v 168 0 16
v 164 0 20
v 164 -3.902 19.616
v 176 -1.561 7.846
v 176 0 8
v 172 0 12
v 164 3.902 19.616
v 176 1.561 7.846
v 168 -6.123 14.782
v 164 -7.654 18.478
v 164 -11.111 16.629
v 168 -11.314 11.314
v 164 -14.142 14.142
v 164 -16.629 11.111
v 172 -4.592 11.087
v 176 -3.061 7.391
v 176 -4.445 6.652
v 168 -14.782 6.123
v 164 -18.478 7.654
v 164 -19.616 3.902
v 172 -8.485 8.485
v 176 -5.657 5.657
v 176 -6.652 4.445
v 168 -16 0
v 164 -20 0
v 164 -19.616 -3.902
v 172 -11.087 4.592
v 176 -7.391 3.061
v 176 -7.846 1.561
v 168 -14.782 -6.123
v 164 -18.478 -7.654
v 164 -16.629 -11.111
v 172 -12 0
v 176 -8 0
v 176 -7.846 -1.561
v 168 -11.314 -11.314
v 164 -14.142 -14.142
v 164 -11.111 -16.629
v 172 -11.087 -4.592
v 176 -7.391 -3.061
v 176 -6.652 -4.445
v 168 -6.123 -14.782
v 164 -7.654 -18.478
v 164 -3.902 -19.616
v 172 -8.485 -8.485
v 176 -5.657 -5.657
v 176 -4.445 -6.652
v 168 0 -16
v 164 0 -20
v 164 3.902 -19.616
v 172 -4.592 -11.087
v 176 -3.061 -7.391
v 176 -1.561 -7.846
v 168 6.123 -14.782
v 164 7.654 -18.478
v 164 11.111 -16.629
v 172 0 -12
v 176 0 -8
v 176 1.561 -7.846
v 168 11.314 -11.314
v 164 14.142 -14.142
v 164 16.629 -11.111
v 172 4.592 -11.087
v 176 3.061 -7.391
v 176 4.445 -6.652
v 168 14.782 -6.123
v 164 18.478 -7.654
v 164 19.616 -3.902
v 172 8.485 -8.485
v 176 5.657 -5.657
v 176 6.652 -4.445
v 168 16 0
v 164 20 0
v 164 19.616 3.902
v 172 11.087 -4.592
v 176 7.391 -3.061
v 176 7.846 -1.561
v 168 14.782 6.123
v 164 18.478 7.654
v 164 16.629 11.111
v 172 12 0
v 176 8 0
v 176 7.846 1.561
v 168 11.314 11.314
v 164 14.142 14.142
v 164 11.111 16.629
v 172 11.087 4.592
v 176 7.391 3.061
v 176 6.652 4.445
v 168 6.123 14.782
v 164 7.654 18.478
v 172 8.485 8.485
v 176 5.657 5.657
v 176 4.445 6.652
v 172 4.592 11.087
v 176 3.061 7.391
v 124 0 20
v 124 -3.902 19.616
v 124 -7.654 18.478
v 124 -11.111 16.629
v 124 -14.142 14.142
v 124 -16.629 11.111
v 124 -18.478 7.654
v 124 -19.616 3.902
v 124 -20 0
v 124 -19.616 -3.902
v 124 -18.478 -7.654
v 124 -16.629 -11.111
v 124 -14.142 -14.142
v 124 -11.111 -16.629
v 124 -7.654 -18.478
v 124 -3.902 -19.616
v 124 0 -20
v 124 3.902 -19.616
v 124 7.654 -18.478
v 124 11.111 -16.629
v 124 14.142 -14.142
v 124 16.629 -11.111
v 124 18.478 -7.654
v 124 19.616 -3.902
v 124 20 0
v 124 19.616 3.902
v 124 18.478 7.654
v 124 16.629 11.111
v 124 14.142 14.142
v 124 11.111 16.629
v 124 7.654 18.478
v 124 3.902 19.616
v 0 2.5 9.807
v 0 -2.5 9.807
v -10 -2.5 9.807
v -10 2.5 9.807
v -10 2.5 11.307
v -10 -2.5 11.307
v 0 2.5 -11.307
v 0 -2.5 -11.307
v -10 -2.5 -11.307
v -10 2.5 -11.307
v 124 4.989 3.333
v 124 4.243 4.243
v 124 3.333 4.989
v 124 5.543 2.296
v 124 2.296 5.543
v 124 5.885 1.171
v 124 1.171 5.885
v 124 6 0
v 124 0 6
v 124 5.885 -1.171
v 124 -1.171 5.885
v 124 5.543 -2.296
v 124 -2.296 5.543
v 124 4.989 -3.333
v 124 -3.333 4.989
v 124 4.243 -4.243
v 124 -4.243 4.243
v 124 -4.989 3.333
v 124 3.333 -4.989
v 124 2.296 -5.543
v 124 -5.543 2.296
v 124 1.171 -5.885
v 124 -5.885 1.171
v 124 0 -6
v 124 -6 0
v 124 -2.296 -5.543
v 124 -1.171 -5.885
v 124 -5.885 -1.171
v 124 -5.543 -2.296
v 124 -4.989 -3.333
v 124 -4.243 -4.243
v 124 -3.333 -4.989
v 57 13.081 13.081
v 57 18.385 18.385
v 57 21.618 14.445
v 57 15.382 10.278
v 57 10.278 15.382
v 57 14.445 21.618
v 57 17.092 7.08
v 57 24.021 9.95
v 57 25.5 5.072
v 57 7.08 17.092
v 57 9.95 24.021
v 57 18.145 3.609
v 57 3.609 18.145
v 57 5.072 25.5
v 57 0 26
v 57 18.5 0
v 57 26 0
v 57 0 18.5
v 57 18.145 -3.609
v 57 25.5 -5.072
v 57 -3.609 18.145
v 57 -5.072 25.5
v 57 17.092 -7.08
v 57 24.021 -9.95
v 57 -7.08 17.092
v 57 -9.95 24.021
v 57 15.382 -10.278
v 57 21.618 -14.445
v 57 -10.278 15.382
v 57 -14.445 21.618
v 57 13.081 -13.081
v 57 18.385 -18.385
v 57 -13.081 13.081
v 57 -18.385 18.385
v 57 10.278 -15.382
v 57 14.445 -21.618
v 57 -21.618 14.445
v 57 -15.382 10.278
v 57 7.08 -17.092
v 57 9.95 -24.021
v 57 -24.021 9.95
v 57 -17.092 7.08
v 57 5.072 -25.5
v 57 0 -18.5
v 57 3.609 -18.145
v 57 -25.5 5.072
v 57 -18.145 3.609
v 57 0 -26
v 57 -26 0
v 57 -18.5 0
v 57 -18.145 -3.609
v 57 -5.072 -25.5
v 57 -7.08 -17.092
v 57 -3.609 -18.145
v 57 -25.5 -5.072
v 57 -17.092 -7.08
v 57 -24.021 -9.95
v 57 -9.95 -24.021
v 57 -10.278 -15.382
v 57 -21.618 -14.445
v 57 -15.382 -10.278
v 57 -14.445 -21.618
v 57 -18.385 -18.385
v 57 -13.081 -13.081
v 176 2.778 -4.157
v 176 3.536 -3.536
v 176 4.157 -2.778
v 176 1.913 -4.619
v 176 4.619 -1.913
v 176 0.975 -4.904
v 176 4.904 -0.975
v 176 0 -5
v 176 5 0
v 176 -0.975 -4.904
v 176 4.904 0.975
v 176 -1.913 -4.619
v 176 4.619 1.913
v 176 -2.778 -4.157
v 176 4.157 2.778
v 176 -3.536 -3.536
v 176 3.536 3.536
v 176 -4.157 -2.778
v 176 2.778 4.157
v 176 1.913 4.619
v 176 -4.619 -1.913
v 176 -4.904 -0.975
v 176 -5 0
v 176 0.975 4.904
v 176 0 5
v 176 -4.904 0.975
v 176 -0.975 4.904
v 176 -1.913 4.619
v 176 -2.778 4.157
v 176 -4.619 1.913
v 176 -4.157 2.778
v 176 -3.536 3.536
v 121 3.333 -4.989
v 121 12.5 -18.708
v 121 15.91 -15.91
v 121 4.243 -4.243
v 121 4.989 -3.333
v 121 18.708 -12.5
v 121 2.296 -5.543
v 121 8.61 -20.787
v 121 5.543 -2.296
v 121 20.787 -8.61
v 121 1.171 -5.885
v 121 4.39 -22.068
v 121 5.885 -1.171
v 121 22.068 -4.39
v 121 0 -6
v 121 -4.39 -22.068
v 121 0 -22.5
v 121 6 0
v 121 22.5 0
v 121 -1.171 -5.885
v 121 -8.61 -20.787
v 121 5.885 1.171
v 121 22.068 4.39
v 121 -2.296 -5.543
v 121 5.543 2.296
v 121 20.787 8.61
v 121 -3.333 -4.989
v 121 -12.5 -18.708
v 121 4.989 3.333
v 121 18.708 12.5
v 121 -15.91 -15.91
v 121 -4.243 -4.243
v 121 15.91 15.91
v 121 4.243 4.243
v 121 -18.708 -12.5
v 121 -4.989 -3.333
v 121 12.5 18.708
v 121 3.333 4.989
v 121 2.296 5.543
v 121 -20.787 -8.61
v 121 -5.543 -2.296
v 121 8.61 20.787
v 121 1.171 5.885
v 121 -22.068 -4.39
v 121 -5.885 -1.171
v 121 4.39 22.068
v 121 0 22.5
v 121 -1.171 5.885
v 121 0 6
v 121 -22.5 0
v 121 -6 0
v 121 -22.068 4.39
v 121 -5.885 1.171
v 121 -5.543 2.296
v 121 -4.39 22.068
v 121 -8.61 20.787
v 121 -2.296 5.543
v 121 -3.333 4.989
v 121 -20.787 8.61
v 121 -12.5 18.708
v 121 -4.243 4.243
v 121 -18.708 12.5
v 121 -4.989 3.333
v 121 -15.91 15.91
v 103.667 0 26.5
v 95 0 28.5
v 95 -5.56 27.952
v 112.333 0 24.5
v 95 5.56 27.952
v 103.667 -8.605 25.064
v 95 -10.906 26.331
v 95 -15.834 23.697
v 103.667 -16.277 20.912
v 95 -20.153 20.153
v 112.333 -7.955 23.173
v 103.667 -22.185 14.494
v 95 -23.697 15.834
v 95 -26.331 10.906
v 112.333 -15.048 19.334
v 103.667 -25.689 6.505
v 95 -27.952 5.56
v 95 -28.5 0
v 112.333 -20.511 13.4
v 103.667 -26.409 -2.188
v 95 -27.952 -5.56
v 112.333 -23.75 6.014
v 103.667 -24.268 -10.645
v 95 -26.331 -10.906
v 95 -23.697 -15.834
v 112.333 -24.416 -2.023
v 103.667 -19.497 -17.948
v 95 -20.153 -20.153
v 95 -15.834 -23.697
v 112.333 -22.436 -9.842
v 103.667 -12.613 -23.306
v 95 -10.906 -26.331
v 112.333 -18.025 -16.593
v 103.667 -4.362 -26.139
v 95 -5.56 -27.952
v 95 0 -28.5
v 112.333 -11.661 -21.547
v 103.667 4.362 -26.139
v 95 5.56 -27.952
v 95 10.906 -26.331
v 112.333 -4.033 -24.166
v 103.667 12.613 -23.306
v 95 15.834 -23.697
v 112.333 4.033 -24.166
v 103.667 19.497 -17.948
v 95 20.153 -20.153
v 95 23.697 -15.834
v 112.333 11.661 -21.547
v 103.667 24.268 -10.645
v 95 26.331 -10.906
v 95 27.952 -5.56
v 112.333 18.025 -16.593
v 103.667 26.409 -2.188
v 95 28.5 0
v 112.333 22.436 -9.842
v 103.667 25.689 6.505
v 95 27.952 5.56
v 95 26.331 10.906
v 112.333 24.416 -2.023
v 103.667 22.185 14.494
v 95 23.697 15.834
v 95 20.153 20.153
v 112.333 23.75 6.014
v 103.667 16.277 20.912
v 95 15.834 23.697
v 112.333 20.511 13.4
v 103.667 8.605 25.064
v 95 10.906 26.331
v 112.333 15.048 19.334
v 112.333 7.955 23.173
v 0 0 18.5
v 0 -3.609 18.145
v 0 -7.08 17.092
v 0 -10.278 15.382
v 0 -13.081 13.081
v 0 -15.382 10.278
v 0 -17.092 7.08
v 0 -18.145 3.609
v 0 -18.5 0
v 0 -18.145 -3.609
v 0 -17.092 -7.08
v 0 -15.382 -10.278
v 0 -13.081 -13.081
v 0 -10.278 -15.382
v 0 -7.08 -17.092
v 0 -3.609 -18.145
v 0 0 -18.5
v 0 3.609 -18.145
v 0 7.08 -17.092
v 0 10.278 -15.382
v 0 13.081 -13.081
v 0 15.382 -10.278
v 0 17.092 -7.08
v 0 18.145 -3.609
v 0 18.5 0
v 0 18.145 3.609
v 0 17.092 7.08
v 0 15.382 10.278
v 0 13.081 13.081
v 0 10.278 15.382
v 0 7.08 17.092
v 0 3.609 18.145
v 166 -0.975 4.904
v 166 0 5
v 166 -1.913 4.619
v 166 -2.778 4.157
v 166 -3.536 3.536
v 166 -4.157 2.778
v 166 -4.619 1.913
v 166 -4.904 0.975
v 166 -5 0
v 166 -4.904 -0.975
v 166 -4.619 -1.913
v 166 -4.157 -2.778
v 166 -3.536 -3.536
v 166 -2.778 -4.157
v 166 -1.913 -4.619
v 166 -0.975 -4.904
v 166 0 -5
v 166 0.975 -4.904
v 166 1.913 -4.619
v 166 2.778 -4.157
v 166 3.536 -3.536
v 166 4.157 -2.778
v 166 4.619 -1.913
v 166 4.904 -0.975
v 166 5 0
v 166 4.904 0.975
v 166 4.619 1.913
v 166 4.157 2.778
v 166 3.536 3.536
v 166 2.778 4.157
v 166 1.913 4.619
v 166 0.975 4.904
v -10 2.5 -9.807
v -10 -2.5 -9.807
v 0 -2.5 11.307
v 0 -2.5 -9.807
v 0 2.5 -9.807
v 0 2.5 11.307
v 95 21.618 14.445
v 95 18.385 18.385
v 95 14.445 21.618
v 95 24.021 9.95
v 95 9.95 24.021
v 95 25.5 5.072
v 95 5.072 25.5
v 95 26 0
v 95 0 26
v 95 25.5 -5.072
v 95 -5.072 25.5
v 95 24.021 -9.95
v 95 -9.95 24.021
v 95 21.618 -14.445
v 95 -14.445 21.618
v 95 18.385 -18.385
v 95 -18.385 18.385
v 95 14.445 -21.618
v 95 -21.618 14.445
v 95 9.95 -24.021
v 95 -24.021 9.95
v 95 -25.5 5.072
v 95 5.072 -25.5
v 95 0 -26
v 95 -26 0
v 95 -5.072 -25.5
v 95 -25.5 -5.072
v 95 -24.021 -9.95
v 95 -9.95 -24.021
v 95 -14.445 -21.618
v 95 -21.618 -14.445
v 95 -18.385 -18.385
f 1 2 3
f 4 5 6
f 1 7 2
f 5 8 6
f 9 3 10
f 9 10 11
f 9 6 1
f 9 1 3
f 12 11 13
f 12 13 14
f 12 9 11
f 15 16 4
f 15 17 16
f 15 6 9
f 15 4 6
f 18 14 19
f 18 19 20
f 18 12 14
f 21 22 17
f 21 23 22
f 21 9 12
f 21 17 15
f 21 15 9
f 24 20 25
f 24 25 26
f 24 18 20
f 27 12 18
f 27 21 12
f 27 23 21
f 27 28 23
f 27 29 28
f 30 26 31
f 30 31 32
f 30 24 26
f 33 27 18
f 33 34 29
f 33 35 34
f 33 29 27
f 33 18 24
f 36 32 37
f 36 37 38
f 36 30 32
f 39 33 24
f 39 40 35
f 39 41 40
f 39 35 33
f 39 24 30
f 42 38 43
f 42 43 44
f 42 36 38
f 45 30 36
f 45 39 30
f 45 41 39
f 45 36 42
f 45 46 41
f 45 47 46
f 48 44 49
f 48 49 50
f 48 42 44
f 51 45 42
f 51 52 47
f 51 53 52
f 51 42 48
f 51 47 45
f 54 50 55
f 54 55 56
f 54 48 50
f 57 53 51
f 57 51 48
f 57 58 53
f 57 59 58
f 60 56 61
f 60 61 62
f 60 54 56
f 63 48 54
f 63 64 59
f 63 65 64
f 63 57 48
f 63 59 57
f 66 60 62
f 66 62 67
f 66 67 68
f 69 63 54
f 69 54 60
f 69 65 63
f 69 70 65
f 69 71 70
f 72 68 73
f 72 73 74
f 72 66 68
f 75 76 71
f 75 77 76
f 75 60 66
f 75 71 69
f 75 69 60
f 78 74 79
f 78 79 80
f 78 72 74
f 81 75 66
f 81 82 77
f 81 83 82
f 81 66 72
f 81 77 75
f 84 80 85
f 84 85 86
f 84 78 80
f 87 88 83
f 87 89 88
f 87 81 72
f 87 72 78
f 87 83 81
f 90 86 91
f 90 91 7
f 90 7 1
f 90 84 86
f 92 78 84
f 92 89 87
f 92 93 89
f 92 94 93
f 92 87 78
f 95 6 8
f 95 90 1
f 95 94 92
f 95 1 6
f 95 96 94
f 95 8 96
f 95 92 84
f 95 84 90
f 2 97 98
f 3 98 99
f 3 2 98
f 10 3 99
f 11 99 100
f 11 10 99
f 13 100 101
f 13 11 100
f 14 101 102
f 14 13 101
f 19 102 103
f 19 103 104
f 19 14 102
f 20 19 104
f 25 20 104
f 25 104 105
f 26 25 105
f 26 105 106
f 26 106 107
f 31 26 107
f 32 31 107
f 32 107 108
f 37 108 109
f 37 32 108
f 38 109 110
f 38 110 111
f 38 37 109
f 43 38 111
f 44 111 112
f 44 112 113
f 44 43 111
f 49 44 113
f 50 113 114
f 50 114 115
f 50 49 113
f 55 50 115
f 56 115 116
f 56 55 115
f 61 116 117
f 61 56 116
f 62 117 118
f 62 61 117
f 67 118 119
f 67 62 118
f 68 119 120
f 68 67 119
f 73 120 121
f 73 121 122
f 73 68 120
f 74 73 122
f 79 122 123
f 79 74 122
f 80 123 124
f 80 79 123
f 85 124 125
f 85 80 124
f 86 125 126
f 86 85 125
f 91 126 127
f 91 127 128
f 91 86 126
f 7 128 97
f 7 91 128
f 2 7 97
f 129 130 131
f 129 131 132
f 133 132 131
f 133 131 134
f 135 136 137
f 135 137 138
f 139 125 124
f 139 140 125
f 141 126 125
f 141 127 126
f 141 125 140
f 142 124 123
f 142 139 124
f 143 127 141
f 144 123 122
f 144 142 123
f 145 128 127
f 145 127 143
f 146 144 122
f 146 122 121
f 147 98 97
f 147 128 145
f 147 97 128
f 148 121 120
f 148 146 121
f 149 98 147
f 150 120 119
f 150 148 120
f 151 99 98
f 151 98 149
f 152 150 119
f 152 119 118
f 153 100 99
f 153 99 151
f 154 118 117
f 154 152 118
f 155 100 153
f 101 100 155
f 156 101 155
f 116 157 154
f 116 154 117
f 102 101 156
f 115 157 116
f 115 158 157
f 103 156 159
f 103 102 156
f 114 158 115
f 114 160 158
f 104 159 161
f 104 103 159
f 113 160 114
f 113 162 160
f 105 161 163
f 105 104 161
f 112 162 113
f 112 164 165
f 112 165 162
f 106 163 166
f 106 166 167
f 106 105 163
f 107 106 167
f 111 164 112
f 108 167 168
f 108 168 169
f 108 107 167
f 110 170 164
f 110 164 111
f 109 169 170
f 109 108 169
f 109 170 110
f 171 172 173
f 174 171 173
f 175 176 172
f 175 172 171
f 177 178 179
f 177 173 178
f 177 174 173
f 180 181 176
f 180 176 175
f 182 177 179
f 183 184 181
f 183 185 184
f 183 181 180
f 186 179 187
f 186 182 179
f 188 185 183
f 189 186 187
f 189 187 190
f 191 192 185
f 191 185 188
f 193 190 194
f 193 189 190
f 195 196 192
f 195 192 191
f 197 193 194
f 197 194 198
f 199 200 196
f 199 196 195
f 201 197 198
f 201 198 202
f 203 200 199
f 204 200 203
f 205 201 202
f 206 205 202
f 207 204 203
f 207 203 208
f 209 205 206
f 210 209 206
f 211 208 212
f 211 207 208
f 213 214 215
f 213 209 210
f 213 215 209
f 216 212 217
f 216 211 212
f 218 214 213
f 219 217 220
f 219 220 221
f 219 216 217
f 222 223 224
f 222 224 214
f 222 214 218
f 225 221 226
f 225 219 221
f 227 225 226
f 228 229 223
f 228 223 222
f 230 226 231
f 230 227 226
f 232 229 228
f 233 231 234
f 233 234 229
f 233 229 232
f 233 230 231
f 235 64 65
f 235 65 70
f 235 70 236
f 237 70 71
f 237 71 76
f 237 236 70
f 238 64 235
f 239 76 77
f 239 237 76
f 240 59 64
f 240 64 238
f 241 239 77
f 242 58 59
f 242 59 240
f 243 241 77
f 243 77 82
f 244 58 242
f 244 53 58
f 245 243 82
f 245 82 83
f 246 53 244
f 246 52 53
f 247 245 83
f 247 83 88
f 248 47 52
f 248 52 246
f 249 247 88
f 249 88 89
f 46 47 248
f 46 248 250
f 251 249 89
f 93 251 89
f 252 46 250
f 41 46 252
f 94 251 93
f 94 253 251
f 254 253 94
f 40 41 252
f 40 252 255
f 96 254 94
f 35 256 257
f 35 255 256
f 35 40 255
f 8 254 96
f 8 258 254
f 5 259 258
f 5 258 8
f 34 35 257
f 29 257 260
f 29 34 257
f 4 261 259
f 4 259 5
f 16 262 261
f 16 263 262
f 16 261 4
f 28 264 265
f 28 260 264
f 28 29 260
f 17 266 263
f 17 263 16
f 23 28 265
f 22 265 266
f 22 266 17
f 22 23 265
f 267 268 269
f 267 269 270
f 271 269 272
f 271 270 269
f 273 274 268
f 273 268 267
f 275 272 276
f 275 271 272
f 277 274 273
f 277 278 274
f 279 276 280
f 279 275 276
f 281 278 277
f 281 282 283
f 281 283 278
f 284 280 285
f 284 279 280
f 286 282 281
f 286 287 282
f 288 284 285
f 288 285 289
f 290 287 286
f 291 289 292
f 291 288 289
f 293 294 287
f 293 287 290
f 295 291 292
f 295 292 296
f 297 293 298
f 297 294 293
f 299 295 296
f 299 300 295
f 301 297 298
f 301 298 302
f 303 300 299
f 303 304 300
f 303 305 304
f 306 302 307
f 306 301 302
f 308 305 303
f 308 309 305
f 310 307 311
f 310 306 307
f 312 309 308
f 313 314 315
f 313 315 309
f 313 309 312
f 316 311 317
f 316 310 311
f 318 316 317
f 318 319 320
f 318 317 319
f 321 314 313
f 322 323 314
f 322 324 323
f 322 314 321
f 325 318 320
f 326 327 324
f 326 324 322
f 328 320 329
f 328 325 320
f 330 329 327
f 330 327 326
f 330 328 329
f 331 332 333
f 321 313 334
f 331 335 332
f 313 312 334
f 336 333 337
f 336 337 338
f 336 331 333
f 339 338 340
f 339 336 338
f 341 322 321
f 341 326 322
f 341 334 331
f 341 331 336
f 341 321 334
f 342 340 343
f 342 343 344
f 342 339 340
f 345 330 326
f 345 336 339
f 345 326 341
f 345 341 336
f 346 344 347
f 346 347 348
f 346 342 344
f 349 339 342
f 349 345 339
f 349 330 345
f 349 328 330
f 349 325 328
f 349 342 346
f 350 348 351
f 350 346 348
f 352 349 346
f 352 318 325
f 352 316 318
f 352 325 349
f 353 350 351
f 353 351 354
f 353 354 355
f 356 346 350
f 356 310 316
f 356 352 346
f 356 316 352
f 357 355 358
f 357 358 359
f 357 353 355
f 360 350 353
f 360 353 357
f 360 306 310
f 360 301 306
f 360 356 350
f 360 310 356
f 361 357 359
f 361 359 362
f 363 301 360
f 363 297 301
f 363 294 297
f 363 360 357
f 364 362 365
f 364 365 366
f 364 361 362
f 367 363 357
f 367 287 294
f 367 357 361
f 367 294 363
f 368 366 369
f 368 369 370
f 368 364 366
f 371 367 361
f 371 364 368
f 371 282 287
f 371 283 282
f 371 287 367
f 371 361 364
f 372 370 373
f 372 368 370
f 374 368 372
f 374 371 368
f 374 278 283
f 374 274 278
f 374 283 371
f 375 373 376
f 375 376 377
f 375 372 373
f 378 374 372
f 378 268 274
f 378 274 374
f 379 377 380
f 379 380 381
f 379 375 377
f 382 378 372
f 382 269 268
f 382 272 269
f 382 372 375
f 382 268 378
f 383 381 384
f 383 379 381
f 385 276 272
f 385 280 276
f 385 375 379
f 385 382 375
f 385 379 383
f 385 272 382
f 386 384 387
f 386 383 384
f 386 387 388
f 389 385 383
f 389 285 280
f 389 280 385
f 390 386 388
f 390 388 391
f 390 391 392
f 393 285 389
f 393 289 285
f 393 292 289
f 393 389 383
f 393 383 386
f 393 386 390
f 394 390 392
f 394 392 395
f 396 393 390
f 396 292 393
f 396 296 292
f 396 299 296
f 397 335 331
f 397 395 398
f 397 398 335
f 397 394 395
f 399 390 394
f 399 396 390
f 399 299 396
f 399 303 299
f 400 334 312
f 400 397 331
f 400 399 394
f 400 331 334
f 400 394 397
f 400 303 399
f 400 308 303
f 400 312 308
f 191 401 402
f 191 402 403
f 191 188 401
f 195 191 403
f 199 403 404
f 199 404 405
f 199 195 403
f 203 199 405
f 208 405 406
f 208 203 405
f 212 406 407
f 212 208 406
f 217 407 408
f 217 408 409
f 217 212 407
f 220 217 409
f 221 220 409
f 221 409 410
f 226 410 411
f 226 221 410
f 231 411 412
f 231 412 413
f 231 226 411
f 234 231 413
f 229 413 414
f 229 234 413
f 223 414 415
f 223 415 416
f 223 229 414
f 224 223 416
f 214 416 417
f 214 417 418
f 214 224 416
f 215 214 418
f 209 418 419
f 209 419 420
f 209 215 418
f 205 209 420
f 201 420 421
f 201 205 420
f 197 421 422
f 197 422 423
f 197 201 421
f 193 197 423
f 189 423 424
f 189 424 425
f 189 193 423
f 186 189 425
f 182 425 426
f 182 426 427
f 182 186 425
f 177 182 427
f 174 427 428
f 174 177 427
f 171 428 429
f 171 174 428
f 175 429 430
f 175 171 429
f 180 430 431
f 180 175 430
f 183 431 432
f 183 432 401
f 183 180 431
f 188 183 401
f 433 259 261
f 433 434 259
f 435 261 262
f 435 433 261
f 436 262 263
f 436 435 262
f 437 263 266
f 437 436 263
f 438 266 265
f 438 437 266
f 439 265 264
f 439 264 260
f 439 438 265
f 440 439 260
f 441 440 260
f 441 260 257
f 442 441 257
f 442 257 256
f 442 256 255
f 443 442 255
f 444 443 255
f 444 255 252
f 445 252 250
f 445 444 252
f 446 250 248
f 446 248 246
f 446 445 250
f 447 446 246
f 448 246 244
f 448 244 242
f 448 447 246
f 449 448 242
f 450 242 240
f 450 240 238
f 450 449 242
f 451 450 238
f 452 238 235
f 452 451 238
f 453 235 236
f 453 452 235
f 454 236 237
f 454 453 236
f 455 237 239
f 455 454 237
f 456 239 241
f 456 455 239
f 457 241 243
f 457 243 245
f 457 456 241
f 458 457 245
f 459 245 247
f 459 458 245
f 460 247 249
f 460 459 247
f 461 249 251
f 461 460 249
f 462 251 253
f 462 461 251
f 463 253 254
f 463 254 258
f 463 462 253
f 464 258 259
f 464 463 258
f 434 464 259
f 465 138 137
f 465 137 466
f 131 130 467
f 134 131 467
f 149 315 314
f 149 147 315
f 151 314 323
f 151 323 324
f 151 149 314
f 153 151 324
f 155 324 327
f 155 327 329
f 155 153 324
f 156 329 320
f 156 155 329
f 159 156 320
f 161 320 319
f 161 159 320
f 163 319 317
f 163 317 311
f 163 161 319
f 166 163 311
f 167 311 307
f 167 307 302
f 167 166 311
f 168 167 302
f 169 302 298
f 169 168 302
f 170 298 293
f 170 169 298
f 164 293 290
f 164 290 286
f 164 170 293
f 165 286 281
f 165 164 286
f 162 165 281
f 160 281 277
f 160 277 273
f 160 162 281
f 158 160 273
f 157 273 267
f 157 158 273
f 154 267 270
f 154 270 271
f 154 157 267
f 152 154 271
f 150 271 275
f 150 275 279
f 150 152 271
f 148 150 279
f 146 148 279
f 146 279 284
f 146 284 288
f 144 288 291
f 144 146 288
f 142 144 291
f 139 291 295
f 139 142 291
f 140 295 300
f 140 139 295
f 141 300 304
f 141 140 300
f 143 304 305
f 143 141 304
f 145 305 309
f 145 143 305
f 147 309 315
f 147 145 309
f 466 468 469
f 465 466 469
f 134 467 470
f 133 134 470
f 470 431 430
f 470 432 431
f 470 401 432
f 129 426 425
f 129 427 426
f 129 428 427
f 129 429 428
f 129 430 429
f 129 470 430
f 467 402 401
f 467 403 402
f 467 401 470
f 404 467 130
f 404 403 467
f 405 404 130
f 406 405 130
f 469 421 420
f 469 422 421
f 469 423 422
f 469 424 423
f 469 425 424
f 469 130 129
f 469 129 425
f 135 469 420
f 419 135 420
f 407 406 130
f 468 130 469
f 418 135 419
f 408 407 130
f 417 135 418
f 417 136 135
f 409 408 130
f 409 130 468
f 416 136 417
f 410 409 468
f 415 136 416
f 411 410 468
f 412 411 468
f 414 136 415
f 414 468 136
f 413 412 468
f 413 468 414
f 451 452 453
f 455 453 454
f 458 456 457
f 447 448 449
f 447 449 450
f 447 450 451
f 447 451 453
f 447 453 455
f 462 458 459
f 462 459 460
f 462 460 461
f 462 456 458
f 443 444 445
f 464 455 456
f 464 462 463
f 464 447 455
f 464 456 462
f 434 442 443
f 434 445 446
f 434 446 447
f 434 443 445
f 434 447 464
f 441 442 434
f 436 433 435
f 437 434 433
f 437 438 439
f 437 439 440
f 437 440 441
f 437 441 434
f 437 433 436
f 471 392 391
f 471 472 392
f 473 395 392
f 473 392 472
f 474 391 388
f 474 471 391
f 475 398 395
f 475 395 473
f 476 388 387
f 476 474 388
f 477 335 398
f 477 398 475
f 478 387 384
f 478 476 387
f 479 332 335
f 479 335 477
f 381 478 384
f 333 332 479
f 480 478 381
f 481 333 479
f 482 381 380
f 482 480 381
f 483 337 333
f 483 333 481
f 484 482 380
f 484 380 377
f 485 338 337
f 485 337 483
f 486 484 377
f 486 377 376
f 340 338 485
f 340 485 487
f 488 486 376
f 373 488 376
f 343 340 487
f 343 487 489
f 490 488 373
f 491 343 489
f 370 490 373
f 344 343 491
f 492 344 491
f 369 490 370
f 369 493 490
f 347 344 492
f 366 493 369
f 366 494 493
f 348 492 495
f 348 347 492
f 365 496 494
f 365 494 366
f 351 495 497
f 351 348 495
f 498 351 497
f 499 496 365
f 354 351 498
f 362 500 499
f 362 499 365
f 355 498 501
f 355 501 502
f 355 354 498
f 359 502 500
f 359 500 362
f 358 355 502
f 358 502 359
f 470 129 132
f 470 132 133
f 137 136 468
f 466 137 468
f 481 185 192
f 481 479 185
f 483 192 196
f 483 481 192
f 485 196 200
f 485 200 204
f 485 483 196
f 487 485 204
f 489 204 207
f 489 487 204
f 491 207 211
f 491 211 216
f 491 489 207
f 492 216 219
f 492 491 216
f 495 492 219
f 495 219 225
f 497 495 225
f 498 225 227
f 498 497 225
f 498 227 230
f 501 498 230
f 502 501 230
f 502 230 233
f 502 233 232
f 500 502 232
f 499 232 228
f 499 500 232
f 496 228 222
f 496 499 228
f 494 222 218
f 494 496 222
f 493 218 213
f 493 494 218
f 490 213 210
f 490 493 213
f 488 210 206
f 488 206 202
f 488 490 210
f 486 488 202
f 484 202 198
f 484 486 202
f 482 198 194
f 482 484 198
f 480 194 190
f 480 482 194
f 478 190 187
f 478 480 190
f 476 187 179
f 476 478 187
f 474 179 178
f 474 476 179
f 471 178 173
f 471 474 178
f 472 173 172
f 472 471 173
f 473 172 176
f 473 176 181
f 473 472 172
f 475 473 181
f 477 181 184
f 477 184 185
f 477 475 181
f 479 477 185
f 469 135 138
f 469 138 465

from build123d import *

# Parameters (mm, degrees)
SKETCH_2_W      = 1.5
SKETCH_2_H      = 5
EXTRUDE_1_DEPTH = 10


with BuildPart() as part:
    # Эскиз1 → Повернуть1 (revolve)
    with BuildSketch(Plane.XY, mode=Mode.PRIVATE) as revolve_1_sk:
        Polygon((0, 0), (0, 18.5), (57, 18.5), (57, 26), (95, 26), (95, 28.5), (121, 22.5), (121, 6), (124, 6), (124, 20), (164, 20), (176, 8), (176, 5), (166, 5), (166, 0), align=None)
    revolve(revolve_1_sk.sketch.rotate(Axis((0, 0, 0), (1, 0, 0)), 90), axis=Axis((0, 0, 0), (1, 0, 0)))

    # Эскиз2 → Бобышка-Вытянуть1 (add)
    with BuildSketch(Plane.ZY):
        with Locations((10.556652869, 0)):
            Rectangle(SKETCH_2_W, SKETCH_2_H)
        with Locations((-10.556652869, 0)):
            Rectangle(SKETCH_2_W, SKETCH_2_H)
    extrude(amount=EXTRUDE_1_DEPTH)


solid = part.part
